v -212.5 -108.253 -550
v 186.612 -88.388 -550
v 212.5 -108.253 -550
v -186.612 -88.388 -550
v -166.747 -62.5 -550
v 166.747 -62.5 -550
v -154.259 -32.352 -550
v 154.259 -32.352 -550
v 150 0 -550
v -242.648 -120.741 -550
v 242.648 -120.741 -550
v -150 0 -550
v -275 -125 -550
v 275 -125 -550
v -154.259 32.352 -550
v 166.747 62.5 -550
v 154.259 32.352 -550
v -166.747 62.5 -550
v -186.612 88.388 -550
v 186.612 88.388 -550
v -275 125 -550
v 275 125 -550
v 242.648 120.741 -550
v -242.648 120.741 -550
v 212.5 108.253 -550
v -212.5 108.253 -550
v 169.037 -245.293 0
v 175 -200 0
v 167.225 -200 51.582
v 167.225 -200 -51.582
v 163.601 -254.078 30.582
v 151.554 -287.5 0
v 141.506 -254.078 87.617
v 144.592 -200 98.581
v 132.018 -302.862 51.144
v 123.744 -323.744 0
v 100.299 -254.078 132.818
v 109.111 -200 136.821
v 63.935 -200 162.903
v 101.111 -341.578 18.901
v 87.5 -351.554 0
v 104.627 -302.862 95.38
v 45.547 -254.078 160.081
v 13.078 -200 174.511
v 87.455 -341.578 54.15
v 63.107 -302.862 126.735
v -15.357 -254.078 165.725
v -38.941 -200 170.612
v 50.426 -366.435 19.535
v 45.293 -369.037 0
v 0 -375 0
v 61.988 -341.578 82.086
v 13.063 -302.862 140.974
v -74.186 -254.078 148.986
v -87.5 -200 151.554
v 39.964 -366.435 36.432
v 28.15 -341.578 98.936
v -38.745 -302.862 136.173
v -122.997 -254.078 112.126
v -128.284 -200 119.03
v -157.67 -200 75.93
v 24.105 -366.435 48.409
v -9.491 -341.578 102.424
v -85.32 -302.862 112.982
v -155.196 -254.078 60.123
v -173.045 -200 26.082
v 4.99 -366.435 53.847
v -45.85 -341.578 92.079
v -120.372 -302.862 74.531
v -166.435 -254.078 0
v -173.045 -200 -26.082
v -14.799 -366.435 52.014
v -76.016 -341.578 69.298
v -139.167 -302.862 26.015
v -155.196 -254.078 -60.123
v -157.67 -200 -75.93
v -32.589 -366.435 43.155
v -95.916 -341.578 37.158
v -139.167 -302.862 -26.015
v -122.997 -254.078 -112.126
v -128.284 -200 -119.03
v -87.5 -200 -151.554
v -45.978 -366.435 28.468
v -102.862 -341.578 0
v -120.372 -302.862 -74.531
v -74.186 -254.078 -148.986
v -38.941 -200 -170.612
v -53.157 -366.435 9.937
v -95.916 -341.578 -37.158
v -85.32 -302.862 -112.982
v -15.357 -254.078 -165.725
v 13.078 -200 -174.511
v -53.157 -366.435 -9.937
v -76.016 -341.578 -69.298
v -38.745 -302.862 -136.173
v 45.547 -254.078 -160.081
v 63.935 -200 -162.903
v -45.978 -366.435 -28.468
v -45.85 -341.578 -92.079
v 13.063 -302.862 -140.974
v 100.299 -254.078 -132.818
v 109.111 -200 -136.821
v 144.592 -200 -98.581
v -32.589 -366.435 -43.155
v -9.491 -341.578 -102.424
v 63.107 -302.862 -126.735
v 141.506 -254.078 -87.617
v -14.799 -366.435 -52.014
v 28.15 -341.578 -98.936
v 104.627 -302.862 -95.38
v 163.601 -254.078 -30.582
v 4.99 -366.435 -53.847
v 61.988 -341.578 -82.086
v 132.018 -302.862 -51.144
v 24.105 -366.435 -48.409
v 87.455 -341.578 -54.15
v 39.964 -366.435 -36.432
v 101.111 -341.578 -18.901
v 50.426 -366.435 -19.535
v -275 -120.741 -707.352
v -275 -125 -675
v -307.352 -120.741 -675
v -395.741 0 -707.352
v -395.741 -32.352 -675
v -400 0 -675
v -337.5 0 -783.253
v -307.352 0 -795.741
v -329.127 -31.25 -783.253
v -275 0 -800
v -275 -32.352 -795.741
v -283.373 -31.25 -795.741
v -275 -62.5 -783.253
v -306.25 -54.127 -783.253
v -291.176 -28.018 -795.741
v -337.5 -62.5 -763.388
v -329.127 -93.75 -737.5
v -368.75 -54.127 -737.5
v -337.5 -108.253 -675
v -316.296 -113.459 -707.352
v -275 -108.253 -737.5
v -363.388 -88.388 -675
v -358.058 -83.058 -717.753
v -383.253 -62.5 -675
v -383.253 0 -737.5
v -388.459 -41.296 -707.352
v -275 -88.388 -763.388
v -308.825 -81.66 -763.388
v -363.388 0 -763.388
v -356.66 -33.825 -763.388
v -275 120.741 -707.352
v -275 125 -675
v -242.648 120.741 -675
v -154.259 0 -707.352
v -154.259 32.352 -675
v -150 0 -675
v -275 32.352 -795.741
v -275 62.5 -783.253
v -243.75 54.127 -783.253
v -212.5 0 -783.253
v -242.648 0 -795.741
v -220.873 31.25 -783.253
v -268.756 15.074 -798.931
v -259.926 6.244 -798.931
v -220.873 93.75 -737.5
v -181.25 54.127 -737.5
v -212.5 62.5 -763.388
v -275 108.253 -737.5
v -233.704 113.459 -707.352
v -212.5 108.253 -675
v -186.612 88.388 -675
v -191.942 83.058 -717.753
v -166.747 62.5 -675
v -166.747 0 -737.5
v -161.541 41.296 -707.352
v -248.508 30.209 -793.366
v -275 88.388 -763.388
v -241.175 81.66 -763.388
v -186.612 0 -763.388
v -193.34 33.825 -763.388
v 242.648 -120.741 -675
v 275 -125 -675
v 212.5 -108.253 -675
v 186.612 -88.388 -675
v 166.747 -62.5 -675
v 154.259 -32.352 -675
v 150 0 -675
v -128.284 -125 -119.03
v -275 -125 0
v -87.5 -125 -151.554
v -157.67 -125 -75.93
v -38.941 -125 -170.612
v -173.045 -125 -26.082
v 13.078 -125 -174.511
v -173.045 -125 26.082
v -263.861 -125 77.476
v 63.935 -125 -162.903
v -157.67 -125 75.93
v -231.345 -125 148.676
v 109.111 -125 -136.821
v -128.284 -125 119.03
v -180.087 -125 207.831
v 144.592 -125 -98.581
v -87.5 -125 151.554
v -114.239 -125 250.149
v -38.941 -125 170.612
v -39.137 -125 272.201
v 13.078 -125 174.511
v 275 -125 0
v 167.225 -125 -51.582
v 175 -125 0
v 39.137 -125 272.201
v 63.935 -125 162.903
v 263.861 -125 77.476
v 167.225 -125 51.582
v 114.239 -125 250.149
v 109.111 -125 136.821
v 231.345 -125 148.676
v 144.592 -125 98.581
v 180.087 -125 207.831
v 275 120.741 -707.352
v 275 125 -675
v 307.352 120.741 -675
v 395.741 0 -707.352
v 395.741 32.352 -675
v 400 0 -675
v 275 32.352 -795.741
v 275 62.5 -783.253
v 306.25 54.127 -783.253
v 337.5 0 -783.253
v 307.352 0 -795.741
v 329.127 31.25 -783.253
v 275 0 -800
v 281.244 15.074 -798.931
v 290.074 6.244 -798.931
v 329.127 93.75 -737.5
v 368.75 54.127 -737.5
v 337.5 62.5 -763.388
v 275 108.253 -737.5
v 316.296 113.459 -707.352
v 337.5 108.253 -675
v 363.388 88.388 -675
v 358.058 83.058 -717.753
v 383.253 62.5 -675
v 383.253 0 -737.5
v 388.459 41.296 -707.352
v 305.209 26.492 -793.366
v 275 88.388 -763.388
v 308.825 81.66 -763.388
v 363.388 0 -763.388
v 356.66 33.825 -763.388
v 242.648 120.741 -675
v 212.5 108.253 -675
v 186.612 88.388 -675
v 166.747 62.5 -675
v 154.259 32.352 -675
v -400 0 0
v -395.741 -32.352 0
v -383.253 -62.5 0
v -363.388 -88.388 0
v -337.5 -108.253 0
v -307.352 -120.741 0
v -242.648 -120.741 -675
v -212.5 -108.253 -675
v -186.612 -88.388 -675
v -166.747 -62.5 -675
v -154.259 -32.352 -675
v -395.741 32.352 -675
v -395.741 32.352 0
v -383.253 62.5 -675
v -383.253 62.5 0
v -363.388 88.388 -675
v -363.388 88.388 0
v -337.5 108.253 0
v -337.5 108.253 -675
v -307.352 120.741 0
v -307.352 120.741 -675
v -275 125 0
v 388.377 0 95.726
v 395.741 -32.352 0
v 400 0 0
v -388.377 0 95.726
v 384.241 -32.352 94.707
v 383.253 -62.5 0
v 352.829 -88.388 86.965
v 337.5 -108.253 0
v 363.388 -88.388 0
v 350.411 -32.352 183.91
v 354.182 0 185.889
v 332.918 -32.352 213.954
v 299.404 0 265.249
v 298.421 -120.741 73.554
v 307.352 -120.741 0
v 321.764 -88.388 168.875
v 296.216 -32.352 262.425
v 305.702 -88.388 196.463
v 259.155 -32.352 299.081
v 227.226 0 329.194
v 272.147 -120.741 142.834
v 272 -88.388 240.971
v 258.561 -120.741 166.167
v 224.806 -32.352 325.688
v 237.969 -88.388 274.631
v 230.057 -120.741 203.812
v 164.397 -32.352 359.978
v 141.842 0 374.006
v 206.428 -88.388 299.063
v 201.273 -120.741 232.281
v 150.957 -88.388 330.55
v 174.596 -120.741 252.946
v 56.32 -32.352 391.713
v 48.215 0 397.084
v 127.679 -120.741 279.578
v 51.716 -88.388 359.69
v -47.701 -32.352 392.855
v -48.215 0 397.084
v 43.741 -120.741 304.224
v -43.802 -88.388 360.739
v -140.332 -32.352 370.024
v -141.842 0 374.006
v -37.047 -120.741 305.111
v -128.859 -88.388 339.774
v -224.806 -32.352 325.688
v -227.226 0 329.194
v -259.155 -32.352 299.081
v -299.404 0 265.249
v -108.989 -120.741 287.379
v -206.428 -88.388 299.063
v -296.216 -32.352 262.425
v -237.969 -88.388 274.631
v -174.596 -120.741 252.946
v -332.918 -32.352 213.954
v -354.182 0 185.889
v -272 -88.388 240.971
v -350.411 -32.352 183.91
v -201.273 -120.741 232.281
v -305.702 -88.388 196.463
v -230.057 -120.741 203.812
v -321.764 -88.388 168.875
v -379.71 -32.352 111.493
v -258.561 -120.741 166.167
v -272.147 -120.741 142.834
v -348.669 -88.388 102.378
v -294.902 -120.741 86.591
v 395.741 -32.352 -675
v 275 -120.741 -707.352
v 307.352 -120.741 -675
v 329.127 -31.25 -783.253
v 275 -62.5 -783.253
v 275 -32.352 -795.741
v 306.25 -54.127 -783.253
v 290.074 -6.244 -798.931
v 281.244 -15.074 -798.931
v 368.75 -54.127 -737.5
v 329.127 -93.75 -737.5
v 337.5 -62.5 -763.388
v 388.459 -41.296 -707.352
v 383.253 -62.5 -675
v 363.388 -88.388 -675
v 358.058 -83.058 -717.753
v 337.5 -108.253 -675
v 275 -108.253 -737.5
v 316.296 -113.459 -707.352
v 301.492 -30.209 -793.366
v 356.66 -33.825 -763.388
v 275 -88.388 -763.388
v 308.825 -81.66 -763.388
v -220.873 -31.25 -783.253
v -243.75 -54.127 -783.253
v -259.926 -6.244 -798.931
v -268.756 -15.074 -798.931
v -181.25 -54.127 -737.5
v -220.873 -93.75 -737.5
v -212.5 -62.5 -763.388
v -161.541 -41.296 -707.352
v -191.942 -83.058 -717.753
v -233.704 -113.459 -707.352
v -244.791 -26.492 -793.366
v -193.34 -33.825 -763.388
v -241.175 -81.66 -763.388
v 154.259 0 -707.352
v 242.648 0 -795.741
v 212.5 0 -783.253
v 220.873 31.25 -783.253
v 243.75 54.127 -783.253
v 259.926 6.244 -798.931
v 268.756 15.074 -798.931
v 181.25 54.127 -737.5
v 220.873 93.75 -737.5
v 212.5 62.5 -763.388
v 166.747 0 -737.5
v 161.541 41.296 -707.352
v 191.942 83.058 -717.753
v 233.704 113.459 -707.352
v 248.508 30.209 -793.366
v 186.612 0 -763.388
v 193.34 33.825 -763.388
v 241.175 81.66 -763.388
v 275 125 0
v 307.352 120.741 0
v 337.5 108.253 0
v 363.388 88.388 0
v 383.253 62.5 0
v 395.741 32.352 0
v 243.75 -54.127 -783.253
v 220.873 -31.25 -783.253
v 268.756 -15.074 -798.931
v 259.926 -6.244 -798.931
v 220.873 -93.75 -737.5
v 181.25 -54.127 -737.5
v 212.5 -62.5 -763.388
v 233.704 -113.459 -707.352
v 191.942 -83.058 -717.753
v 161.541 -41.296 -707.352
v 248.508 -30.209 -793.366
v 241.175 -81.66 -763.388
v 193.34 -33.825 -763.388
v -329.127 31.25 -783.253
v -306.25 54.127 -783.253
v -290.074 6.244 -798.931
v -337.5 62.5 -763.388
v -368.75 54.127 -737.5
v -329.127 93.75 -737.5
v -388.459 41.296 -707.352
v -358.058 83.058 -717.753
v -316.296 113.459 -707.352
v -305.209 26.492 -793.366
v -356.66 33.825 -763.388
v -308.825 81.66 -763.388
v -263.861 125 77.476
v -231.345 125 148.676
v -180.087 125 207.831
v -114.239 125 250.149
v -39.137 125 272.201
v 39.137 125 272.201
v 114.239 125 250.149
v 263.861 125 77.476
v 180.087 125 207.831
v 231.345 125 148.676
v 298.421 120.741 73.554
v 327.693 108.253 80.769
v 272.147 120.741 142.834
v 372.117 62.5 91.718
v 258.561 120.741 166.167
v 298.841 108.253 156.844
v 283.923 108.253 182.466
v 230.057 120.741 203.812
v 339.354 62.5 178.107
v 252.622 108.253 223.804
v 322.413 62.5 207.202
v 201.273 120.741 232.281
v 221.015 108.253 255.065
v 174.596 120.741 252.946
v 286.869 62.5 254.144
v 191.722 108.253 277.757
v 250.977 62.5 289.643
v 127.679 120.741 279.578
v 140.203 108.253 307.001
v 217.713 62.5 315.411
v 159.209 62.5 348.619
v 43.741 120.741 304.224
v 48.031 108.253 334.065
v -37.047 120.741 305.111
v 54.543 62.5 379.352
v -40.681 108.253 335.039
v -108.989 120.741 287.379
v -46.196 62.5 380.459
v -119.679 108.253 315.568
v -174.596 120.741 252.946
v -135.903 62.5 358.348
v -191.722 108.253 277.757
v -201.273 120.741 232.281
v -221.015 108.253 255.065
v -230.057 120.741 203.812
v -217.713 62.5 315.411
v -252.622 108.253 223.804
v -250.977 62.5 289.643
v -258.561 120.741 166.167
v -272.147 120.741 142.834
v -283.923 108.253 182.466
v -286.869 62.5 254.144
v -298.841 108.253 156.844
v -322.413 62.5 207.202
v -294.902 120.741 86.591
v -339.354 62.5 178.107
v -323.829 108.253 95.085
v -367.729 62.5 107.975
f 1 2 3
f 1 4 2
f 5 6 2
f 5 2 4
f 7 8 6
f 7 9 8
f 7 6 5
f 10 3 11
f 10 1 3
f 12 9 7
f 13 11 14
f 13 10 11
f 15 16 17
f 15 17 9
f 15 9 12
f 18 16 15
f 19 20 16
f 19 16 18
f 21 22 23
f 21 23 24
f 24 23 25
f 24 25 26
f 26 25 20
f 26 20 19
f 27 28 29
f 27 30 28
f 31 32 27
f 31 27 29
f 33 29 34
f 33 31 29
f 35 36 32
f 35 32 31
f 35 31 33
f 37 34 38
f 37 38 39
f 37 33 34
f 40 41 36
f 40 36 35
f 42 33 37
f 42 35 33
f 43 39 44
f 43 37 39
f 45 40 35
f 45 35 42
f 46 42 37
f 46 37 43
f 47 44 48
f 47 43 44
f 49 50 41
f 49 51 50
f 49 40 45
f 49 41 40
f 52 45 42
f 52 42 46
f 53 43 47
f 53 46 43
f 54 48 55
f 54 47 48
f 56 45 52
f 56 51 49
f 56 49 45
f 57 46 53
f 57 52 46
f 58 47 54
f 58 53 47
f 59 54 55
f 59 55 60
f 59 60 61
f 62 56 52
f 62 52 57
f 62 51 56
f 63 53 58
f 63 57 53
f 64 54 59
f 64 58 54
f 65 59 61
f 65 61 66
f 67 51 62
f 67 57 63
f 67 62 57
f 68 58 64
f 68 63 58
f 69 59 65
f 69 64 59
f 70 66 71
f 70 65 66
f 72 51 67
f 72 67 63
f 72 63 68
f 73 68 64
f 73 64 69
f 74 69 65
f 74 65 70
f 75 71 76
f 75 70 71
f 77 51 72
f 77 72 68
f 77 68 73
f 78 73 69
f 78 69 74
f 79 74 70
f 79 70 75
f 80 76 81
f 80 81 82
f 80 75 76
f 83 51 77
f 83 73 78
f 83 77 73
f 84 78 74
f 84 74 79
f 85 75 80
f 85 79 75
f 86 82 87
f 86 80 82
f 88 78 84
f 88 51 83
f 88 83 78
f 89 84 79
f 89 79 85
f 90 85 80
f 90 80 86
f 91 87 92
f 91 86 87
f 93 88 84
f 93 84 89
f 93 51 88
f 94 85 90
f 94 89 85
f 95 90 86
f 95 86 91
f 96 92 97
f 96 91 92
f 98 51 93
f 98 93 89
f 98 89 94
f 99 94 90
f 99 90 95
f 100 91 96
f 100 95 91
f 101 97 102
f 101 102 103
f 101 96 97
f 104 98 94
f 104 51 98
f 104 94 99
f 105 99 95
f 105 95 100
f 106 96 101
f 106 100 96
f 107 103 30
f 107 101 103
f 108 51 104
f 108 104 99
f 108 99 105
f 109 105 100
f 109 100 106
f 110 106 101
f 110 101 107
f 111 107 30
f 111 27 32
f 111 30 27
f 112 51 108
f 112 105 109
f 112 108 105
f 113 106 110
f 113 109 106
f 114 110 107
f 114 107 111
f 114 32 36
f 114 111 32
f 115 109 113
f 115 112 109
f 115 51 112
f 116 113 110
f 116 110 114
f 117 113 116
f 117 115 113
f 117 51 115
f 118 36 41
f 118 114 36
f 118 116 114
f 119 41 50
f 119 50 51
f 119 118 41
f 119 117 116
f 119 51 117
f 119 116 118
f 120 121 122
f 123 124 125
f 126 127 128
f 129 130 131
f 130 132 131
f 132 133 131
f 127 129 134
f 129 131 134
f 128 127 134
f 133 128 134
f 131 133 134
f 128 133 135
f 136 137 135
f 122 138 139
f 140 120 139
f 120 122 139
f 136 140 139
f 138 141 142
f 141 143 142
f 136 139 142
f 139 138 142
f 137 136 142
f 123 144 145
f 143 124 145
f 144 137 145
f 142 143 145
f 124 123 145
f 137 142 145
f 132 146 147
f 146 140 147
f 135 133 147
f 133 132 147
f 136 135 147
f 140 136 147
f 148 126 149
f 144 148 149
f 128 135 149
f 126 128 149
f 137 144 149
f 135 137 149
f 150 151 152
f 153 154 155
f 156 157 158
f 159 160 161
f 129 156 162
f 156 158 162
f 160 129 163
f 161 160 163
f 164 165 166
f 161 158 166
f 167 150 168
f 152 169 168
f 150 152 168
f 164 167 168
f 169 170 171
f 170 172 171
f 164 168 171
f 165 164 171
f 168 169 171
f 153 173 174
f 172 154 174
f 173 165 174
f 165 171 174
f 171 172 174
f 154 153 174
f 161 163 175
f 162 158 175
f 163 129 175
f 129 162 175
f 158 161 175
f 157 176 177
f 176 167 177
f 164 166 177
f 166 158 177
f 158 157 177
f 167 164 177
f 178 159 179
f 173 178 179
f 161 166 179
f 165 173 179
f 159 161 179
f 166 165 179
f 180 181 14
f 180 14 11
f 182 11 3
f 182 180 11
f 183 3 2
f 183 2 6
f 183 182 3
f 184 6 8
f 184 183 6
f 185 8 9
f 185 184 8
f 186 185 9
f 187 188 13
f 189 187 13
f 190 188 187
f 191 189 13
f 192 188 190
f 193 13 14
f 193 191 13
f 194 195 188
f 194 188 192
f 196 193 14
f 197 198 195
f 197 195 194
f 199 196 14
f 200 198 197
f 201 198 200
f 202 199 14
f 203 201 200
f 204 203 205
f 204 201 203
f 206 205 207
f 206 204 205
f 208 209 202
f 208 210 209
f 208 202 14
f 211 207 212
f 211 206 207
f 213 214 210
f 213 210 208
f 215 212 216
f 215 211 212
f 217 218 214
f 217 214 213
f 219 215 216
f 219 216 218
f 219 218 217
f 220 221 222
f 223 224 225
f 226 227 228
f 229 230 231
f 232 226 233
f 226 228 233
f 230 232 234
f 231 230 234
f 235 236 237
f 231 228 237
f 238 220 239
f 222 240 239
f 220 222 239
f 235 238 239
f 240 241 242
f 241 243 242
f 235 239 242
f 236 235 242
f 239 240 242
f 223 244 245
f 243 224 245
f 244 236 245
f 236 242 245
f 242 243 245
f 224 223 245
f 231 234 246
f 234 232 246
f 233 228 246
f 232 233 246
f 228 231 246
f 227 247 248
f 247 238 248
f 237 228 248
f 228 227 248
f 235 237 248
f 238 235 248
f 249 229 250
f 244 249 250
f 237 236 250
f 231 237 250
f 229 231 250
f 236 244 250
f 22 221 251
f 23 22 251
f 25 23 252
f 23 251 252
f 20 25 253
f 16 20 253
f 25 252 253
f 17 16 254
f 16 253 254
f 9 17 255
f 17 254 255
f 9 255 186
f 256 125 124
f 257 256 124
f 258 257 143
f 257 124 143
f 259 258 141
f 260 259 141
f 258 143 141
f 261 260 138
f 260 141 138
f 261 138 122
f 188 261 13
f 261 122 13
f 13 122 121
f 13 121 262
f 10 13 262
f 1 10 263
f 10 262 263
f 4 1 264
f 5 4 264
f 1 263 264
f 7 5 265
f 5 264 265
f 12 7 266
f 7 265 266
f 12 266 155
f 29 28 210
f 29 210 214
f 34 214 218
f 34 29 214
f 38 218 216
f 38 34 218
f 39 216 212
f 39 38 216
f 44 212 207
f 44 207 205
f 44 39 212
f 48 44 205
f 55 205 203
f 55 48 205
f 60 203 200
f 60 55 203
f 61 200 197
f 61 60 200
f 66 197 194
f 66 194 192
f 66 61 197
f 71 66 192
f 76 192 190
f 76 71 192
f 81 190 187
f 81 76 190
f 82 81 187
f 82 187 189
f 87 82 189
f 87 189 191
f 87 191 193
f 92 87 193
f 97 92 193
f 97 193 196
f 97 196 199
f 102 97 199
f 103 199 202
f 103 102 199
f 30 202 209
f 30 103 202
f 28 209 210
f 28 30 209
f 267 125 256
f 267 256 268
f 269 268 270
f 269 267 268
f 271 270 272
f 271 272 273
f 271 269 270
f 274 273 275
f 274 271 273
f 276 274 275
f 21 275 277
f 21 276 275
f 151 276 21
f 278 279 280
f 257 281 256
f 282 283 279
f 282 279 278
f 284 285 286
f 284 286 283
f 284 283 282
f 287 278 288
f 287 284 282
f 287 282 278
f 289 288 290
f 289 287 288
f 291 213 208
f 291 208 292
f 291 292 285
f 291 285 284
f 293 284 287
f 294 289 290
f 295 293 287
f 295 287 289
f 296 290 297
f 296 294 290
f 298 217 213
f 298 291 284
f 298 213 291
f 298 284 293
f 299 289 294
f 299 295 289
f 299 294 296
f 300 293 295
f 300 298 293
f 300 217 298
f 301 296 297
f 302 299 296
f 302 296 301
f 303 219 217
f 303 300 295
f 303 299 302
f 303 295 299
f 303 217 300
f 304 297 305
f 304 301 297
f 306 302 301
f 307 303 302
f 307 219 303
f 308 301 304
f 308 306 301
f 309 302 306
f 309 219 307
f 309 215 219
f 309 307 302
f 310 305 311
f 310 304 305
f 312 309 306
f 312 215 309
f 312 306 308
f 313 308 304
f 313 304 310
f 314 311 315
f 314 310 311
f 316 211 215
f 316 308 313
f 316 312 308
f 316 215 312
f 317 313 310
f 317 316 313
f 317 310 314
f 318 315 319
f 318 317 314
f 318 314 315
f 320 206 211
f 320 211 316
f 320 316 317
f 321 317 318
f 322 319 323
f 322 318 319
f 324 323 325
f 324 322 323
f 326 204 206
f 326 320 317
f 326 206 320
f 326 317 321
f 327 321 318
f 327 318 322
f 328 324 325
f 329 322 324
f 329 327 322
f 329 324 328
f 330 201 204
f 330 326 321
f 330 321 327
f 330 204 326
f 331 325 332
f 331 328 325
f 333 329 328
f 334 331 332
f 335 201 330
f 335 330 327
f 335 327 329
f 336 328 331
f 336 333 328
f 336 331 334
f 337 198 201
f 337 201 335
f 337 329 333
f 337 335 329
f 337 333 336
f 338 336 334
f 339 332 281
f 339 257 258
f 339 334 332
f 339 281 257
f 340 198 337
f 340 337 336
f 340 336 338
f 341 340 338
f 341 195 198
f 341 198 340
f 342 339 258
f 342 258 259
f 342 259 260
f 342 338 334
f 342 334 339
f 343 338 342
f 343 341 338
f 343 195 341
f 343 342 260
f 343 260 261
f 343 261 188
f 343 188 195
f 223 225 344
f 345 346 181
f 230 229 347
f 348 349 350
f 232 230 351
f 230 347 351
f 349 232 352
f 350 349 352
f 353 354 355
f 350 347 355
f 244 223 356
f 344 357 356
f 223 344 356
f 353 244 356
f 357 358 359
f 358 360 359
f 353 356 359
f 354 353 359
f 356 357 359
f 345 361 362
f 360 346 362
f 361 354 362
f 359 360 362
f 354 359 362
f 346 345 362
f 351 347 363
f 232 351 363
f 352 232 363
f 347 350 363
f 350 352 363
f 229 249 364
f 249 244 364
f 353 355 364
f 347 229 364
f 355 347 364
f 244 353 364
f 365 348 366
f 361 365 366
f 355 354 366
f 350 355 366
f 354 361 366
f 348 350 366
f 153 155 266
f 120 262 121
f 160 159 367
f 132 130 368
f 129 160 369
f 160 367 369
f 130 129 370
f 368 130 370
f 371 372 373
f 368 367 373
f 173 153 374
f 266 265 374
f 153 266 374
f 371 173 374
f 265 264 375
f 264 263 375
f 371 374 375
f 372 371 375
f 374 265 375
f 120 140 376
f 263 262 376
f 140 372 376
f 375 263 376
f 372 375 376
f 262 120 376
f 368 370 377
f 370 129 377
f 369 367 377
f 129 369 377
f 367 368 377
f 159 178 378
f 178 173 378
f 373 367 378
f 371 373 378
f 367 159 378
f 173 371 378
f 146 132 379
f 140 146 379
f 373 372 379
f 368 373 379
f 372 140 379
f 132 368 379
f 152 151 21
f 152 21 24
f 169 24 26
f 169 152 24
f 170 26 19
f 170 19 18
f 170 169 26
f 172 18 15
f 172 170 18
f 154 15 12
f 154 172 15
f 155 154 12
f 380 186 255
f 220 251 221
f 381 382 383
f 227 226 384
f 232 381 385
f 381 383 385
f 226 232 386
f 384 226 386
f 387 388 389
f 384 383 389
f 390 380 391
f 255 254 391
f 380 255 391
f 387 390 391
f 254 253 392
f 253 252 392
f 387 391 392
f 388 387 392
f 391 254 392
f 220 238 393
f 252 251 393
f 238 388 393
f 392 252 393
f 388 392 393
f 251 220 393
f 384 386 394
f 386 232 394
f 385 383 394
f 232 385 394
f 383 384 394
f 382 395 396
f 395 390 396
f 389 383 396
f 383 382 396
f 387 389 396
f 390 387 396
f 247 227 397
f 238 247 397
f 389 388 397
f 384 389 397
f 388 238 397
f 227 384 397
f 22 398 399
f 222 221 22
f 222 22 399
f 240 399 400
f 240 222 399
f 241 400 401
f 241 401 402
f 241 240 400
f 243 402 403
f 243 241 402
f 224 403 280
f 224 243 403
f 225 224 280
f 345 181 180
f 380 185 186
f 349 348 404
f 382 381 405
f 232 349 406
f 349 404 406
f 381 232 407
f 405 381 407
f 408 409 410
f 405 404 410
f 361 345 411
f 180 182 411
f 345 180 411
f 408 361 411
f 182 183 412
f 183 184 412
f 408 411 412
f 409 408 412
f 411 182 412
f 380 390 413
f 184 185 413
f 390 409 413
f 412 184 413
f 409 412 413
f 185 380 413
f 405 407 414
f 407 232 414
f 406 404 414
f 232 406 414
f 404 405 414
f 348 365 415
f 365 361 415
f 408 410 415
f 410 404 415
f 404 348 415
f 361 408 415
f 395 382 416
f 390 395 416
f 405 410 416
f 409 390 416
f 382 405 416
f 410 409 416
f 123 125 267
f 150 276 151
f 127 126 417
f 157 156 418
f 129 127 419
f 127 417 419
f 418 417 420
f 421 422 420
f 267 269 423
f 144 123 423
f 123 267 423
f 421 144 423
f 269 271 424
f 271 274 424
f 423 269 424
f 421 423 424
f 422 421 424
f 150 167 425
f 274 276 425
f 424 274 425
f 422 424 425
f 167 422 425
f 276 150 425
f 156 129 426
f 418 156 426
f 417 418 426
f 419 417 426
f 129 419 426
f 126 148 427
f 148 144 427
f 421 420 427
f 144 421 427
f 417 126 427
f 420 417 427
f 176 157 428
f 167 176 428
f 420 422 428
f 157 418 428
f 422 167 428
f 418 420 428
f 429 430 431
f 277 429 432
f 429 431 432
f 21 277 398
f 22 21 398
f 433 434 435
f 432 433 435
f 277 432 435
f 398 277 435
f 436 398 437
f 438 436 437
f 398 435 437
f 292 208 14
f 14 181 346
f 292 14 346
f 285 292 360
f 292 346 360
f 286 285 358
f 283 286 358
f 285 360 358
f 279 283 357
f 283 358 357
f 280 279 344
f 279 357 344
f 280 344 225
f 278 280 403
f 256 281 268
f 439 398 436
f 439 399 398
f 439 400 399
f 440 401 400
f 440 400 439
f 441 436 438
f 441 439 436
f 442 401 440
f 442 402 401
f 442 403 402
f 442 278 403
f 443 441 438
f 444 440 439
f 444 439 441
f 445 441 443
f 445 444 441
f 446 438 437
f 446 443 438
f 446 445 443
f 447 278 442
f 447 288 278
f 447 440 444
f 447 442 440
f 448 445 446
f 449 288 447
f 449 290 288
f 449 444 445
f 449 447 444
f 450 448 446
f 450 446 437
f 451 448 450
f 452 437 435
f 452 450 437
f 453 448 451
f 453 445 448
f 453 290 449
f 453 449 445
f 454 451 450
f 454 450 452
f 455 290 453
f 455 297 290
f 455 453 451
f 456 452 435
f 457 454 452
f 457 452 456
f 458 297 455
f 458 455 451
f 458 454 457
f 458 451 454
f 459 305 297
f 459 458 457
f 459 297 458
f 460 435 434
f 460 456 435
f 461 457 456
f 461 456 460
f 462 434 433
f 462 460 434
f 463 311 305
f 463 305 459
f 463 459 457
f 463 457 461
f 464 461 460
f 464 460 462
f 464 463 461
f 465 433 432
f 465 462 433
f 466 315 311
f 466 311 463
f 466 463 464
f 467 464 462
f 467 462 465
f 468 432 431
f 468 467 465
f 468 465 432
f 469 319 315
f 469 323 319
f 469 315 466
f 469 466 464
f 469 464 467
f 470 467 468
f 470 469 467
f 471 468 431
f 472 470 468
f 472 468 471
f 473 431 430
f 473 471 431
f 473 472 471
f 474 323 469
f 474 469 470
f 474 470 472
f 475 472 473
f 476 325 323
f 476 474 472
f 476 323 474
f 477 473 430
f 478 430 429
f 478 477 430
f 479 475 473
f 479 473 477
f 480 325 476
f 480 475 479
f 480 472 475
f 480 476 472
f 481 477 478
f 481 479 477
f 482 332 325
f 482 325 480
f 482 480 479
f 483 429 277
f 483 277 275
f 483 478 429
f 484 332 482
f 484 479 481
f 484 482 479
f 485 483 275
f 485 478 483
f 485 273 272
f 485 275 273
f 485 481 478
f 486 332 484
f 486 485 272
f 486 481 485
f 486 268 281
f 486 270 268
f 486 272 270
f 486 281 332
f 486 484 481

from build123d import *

# Parameters (mm, degrees)
F1_DEPTH     = 125
F2_R         = 175
F3_DEPTH     = 250
F4_R         = 124.99999
F5_T1_DEPTH  = 800
F5_T3_DEPTH  = 250
F5_T6_ANGLE  = 90
F5_T8_ANGLE  = 90
F5_T10_ANGLE = 90
F5_T12_ANGLE = 90
F5_T14_ANGLE = 90
F5_T16_ANGLE = 90
F5_T18_ANGLE = 90
F5_T20_ANGLE = 90
F5_T22_ANGLE = 180
F5_T24_ANGLE = 180
F6_R         = 175


# Not quite as in the source:
# - a fillet or chamfer that OpenCascade refuses, or shapes differently, is made with other operations: its cross-section is extruded or revolved along the edge and cut away or added
# - a fillet or chamfer is up to 0.001 mm smaller than in the source, because OpenCascade refuses the exact size


with BuildPart() as f1:
    # F0 (on Front) → F1 (new body, symmetric)
    with BuildSketch(Plane.XZ):
        with BuildLine():
            Line((400, -800), (400, 0))
            ThreePointArc((400, 0), (0, 400), (-400, 0))
            Line((-400, 0), (-400, -800))
            Line((-400, -800), (-150, -800))
            Line((-150, -800), (-150, -550))
            Line((-150, -550), (150, -550))
            Line((150, -550), (150, -800))
            Line((150, -800), (400, -800))
        make_face()
    extrude(amount=F1_DEPTH, both=True)

    # F2 (on face) → F3 (join, symmetric)
    with BuildSketch(Plane.XZ.offset(125)):
        Circle(F2_R)
    extrude(amount=F3_DEPTH, both=True)

    # F4 (radius 125 in the source; OpenCascade refuses exactly that, so slightly less here)
    f4_edges = [f1.edges().sort_by_distance(p)[0] for p in [
        (-400, 0, -800),
        (-275, 125, -800),
        (-150, 0, -800),
        (-275, -125, -800),
        (150, 0, -800),
        (275, 125, -800),
        (400, 0, -800),
        (275, -125, -800),
    ]]
    fillet(f4_edges, radius=F4_R)

    # F5: fillet of radius 125 on 8 edges, made by hand

    # F5_s2 → F5_t1 (cut)
    with BuildSketch(Plane.XY.offset(-800)):
        with BuildLine():
            ThreePointArc((275, -125), (363.3883476483, -88.3883476483), (400, 0))
            Line((400, 0), (400, -125))
            Line((400, -125), (275, -125))
        make_face()
        with BuildLine():
            ThreePointArc((275, 125), (363.3883476483, 88.3883476483), (400, 0))
            Line((400, 0), (400, 125))
            Line((400, 125), (275, 125))
        make_face()
        with BuildLine():
            ThreePointArc((-400, 0), (-363.3883476483, -88.3883476483), (-275, -125))
            Line((-275, -125), (-400, -125))
            Line((-400, -125), (-400, 0))
        make_face()
        with BuildLine():
            ThreePointArc((-400, 0), (-363.3883476483, 88.3883476483), (-275, 125))
            Line((-275, 125), (-400, 125))
            Line((-400, 125), (-400, 0))
        make_face()
    extrude(amount=F5_T1_DEPTH, mode=Mode.SUBTRACT)

    # F5_s4 → F5_t3 (cut)
    with BuildSketch(Plane.XY.offset(-800)):
        with BuildLine():
            ThreePointArc((-275, 125), (-186.6116523517, 88.3883476483), (-150, 0))
            Line((-150, 0), (-150, 125))
            Line((-150, 125), (-275, 125))
        make_face()
        with BuildLine():
            ThreePointArc((-275, -125), (-186.6116523517, -88.3883476483), (-150, 0))
            Line((-150, 0), (-150, -125))
            Line((-150, -125), (-275, -125))
        make_face()
        with BuildLine():
            ThreePointArc((275, -125), (186.6116523517, -88.3883476483), (150, 0))
            Line((150, 0), (150, -125))
            Line((150, -125), (275, -125))
        make_face()
        with BuildLine():
            ThreePointArc((275, 125), (186.6116523517, 88.3883476483), (150, 0))
            Line((150, 0), (150, 125))
            Line((150, 125), (275, 125))
        make_face()
    extrude(amount=F5_T3_DEPTH, mode=Mode.SUBTRACT)

    # F5_s5 → F5_t6 (revolve, cut)
    with BuildSketch(Plane.XZ):
        with BuildLine():
            ThreePointArc((274.99999, -800), (186.6116494227, -763.3883505773), (150, -675.00001))
            Line((150, -675.00001), (150, -800))
            Line((150, -800), (274.99999, -800))
        make_face()
    revolve(axis=Axis((275, 0, -800), (0, 0, -1)), revolution_arc=F5_T6_ANGLE, mode=Mode.SUBTRACT)

    # F5_s7 → F5_t8 (revolve, cut)
    with BuildSketch(Plane.YZ.offset(275)):
        with BuildLine():
            ThreePointArc((-1e-05, -800), (-88.3883505773, -763.3883505773), (-125, -675.00001))
            Line((-125, -675.00001), (-125, -800))
            Line((-125, -800), (-1e-05, -800))
        make_face()
    revolve(axis=Axis((275, 0, -800), (0, 0, -1)), revolution_arc=F5_T8_ANGLE, mode=Mode.SUBTRACT)

    # F5_s9 → F5_t10 (revolve, cut)
    with BuildSketch(Plane.XZ):
        with BuildLine():
            ThreePointArc((-274.99999, -800), (-186.6116494227, -763.3883505773), (-150, -675.00001))
            Line((-150, -675.00001), (-150, -800))
            Line((-150, -800), (-274.99999, -800))
        make_face()
    revolve(axis=Axis((-275, 0, -800), (0, 0, -1)), revolution_arc=F5_T10_ANGLE, mode=Mode.SUBTRACT)

    # F5_s11 → F5_t12 (revolve, cut)
    with BuildSketch(Plane.YZ.offset(-275)):
        with BuildLine():
            ThreePointArc((1e-05, -800), (88.3883505773, -763.3883505773), (125, -675.00001))
            Line((125, -675.00001), (125, -800))
            Line((125, -800), (1e-05, -800))
        make_face()
    revolve(axis=Axis((-275, 0, -800), (0, 0, -1)), revolution_arc=F5_T12_ANGLE, mode=Mode.SUBTRACT)

    # F5_s13 → F5_t14 (revolve, cut)
    with BuildSketch(Plane.XZ):
        with BuildLine():
            ThreePointArc((-275.00001, -800), (-363.3883505773, -763.3883505773), (-400, -675.00001))
            Line((-400, -675.00001), (-400, -800))
            Line((-400, -800), (-275.00001, -800))
        make_face()
    revolve(axis=Axis((-275, 0, -800), (0, 0, -1)), revolution_arc=F5_T14_ANGLE, mode=Mode.SUBTRACT)

    # F5_s15 → F5_t16 (revolve, cut)
    with BuildSketch(Plane.YZ.offset(-275)):
        with BuildLine():
            ThreePointArc((-1e-05, -800), (-88.3883505773, -763.3883505773), (-125, -675.00001))
            Line((-125, -675.00001), (-125, -800))
            Line((-125, -800), (-1e-05, -800))
        make_face()
    revolve(axis=Axis((-275, 0, -800), (0, 0, -1)), revolution_arc=F5_T16_ANGLE, mode=Mode.SUBTRACT)

    # F5_s17 → F5_t18 (revolve, cut)
    with BuildSketch(Plane.YZ.offset(275)):
        with BuildLine():
            ThreePointArc((1e-05, -800), (88.3883505773, -763.3883505773), (125, -675.00001))
            Line((125, -675.00001), (125, -800))
            Line((125, -800), (1e-05, -800))
        make_face()
    revolve(axis=Axis((275, 0, -800), (0, 0, -1)), revolution_arc=F5_T18_ANGLE, mode=Mode.SUBTRACT)

    # F5_s19 → F5_t20 (revolve, cut)
    with BuildSketch(Plane.XZ):
        with BuildLine():
            ThreePointArc((275.00001, -800), (363.3883505773, -763.3883505773), (400, -675.00001))
            Line((400, -675.00001), (400, -800))
            Line((400, -800), (275.00001, -800))
        make_face()
    revolve(axis=Axis((275, 0, -800), (0, 0, -1)), revolution_arc=F5_T20_ANGLE, mode=Mode.SUBTRACT)

    # F5_s21 → F5_t22 (revolve, cut)
    with BuildSketch(Plane.XY):
        with BuildLine():
            ThreePointArc((275, 125), (363.3883476483, 88.3883476483), (400, 0))
            Line((400, 0), (400, 125))
            Line((400, 125), (275, 125))
        make_face()
    revolve(axis=Axis((0, 125, 0), (0, -1, 0)), revolution_arc=F5_T22_ANGLE, mode=Mode.SUBTRACT)

    # F5_s23 → F5_t24 (revolve, cut)
    with BuildSketch(Plane.XY):
        with BuildLine():
            ThreePointArc((400, 0), (363.3883476483, -88.3883476483), (275, -125))
            Line((275, -125), (400, -125))
            Line((400, -125), (400, 0))
        make_face()
    revolve(axis=Axis((0, -125, 0), (0, -1, 0)), revolution_arc=F5_T24_ANGLE, mode=Mode.SUBTRACT)

    # F6
    f6_edges = [f1.edges().sort_by_distance(p)[0] for p in [
        (-175, -375, 0),
    ]]
    fillet(f6_edges, radius=F6_R)


solid = f1.part
